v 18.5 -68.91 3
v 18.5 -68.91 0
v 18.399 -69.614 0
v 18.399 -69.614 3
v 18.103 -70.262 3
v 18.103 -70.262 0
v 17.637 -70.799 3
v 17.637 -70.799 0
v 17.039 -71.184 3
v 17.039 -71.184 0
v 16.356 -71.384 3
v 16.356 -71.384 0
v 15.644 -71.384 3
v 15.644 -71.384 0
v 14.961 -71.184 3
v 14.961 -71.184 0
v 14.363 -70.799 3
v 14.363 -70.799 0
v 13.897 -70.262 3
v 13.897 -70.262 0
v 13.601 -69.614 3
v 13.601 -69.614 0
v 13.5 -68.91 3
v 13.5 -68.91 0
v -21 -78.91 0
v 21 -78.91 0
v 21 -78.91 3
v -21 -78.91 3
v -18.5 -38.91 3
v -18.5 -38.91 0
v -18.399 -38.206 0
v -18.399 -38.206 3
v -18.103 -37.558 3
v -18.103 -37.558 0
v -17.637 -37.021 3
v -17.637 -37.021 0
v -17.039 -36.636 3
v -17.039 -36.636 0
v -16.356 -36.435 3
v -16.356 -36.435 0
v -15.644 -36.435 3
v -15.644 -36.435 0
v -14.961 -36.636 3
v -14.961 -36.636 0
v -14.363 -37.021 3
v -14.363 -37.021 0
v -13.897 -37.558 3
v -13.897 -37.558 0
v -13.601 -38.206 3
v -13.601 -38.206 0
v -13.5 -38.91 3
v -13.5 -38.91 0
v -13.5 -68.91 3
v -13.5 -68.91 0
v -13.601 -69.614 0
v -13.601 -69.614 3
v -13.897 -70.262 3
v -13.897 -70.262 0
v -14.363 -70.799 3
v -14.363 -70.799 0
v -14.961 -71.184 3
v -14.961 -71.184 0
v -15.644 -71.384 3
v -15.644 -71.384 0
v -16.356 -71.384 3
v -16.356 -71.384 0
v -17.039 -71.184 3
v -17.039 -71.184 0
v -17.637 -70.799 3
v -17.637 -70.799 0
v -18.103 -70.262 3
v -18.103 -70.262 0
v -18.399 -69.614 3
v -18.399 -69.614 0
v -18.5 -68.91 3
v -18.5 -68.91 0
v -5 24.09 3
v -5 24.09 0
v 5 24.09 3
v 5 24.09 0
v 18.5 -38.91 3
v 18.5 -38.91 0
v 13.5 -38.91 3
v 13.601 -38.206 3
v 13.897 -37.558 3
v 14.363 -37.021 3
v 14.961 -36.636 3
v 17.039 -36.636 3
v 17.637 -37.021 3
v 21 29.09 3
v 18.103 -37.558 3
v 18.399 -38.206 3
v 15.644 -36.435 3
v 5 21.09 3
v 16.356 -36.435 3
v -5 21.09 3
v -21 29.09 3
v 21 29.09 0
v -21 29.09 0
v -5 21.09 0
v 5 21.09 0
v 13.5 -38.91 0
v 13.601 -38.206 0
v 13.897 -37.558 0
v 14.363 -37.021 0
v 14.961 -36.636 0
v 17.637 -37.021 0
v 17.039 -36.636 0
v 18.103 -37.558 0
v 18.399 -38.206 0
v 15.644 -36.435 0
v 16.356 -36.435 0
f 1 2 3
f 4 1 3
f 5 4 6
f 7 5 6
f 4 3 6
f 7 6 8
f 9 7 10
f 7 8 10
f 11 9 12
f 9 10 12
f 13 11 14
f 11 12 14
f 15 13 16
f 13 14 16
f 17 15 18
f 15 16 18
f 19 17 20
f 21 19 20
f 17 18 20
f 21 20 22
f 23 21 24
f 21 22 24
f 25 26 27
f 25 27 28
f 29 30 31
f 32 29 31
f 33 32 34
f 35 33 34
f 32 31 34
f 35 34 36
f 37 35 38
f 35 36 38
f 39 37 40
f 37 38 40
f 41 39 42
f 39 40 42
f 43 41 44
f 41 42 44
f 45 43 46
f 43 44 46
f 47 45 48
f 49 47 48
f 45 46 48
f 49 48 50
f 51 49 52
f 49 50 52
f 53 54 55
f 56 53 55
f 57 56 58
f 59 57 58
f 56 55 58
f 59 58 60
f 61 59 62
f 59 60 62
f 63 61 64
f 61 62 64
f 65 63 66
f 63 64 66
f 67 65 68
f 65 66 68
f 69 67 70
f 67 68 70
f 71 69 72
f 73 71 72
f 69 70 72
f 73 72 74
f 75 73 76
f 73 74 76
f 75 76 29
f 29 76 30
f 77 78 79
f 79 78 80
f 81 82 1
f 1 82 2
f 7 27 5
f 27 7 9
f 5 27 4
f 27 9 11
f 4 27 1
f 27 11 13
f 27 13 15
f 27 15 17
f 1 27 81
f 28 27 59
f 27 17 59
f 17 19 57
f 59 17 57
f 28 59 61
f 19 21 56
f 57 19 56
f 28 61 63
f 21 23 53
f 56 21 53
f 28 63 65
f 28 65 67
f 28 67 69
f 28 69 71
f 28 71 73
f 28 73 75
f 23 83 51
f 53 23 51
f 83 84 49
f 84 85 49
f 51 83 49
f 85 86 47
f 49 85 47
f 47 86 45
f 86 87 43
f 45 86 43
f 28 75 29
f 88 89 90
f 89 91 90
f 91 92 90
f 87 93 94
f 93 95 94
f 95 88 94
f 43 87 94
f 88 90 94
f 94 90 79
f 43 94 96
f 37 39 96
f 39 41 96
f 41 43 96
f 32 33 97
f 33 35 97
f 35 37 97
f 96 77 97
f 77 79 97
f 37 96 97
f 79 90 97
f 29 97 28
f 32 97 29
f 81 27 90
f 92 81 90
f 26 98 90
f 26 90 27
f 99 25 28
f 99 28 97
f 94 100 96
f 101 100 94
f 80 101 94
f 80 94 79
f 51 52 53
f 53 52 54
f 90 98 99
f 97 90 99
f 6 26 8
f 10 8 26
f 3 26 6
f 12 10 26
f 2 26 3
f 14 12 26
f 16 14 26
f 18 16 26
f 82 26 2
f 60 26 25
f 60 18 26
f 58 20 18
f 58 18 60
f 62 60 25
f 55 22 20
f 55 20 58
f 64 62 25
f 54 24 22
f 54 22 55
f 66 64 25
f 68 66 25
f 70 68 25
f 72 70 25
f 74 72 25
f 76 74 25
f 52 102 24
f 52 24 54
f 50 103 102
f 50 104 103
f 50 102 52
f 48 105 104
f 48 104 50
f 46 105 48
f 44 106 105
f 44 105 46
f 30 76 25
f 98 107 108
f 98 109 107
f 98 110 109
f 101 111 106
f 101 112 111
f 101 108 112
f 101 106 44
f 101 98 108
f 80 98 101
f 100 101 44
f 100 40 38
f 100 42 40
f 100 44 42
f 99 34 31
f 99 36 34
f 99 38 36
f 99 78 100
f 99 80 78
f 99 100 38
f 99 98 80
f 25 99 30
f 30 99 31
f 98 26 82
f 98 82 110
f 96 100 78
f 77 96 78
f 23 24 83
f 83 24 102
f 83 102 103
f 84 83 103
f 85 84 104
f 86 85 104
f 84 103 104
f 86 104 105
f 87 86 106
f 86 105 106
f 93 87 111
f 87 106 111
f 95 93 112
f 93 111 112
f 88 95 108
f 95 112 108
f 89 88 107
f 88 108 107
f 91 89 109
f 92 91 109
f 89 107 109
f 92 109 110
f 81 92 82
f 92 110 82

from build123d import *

# Parameters (mm, degrees)
SKETCH1_W           = 10
SKETCH1_H           = 3
BOSS_EXTRUDE1_DEPTH = 3


with BuildPart() as part:
    # Sketch1 → Boss-Extrude1 (new body)
    with BuildSketch(Plane.XY):
        Polygon((21, -78.90992989), (-21, -78.90992989), (-21, 29.09007011), (-5, 29.09007011), (21, 29.09007011), align=None)
        with BuildLine():
            Line((-13.5, -38.90992989), (-13.5, -68.90992989))
            ThreePointArc((-13.5, -68.90992989), (-16, -71.40992989), (-18.5, -68.90992989))
            Line((-18.5, -68.90992989), (-18.5, -38.90992989))
            ThreePointArc((-18.5, -38.90992989), (-16, -36.40992989), (-13.5, -38.90992989))
        make_face(mode=Mode.SUBTRACT)
        with BuildLine():
            Line((18.5, -38.90992989), (18.5, -68.90992989))
            ThreePointArc((18.5, -68.90992989), (16, -71.40992989), (13.5, -68.90992989))
            Line((13.5, -68.90992989), (13.5, -38.90992989))
            ThreePointArc((13.5, -38.90992989), (16, -36.40992989), (18.5, -38.90992989))
        make_face(mode=Mode.SUBTRACT)
        with Locations((0, 22.59007011)):
            Rectangle(SKETCH1_W, SKETCH1_H, mode=Mode.SUBTRACT)
    extrude(amount=BOSS_EXTRUDE1_DEPTH)


solid = part.part
